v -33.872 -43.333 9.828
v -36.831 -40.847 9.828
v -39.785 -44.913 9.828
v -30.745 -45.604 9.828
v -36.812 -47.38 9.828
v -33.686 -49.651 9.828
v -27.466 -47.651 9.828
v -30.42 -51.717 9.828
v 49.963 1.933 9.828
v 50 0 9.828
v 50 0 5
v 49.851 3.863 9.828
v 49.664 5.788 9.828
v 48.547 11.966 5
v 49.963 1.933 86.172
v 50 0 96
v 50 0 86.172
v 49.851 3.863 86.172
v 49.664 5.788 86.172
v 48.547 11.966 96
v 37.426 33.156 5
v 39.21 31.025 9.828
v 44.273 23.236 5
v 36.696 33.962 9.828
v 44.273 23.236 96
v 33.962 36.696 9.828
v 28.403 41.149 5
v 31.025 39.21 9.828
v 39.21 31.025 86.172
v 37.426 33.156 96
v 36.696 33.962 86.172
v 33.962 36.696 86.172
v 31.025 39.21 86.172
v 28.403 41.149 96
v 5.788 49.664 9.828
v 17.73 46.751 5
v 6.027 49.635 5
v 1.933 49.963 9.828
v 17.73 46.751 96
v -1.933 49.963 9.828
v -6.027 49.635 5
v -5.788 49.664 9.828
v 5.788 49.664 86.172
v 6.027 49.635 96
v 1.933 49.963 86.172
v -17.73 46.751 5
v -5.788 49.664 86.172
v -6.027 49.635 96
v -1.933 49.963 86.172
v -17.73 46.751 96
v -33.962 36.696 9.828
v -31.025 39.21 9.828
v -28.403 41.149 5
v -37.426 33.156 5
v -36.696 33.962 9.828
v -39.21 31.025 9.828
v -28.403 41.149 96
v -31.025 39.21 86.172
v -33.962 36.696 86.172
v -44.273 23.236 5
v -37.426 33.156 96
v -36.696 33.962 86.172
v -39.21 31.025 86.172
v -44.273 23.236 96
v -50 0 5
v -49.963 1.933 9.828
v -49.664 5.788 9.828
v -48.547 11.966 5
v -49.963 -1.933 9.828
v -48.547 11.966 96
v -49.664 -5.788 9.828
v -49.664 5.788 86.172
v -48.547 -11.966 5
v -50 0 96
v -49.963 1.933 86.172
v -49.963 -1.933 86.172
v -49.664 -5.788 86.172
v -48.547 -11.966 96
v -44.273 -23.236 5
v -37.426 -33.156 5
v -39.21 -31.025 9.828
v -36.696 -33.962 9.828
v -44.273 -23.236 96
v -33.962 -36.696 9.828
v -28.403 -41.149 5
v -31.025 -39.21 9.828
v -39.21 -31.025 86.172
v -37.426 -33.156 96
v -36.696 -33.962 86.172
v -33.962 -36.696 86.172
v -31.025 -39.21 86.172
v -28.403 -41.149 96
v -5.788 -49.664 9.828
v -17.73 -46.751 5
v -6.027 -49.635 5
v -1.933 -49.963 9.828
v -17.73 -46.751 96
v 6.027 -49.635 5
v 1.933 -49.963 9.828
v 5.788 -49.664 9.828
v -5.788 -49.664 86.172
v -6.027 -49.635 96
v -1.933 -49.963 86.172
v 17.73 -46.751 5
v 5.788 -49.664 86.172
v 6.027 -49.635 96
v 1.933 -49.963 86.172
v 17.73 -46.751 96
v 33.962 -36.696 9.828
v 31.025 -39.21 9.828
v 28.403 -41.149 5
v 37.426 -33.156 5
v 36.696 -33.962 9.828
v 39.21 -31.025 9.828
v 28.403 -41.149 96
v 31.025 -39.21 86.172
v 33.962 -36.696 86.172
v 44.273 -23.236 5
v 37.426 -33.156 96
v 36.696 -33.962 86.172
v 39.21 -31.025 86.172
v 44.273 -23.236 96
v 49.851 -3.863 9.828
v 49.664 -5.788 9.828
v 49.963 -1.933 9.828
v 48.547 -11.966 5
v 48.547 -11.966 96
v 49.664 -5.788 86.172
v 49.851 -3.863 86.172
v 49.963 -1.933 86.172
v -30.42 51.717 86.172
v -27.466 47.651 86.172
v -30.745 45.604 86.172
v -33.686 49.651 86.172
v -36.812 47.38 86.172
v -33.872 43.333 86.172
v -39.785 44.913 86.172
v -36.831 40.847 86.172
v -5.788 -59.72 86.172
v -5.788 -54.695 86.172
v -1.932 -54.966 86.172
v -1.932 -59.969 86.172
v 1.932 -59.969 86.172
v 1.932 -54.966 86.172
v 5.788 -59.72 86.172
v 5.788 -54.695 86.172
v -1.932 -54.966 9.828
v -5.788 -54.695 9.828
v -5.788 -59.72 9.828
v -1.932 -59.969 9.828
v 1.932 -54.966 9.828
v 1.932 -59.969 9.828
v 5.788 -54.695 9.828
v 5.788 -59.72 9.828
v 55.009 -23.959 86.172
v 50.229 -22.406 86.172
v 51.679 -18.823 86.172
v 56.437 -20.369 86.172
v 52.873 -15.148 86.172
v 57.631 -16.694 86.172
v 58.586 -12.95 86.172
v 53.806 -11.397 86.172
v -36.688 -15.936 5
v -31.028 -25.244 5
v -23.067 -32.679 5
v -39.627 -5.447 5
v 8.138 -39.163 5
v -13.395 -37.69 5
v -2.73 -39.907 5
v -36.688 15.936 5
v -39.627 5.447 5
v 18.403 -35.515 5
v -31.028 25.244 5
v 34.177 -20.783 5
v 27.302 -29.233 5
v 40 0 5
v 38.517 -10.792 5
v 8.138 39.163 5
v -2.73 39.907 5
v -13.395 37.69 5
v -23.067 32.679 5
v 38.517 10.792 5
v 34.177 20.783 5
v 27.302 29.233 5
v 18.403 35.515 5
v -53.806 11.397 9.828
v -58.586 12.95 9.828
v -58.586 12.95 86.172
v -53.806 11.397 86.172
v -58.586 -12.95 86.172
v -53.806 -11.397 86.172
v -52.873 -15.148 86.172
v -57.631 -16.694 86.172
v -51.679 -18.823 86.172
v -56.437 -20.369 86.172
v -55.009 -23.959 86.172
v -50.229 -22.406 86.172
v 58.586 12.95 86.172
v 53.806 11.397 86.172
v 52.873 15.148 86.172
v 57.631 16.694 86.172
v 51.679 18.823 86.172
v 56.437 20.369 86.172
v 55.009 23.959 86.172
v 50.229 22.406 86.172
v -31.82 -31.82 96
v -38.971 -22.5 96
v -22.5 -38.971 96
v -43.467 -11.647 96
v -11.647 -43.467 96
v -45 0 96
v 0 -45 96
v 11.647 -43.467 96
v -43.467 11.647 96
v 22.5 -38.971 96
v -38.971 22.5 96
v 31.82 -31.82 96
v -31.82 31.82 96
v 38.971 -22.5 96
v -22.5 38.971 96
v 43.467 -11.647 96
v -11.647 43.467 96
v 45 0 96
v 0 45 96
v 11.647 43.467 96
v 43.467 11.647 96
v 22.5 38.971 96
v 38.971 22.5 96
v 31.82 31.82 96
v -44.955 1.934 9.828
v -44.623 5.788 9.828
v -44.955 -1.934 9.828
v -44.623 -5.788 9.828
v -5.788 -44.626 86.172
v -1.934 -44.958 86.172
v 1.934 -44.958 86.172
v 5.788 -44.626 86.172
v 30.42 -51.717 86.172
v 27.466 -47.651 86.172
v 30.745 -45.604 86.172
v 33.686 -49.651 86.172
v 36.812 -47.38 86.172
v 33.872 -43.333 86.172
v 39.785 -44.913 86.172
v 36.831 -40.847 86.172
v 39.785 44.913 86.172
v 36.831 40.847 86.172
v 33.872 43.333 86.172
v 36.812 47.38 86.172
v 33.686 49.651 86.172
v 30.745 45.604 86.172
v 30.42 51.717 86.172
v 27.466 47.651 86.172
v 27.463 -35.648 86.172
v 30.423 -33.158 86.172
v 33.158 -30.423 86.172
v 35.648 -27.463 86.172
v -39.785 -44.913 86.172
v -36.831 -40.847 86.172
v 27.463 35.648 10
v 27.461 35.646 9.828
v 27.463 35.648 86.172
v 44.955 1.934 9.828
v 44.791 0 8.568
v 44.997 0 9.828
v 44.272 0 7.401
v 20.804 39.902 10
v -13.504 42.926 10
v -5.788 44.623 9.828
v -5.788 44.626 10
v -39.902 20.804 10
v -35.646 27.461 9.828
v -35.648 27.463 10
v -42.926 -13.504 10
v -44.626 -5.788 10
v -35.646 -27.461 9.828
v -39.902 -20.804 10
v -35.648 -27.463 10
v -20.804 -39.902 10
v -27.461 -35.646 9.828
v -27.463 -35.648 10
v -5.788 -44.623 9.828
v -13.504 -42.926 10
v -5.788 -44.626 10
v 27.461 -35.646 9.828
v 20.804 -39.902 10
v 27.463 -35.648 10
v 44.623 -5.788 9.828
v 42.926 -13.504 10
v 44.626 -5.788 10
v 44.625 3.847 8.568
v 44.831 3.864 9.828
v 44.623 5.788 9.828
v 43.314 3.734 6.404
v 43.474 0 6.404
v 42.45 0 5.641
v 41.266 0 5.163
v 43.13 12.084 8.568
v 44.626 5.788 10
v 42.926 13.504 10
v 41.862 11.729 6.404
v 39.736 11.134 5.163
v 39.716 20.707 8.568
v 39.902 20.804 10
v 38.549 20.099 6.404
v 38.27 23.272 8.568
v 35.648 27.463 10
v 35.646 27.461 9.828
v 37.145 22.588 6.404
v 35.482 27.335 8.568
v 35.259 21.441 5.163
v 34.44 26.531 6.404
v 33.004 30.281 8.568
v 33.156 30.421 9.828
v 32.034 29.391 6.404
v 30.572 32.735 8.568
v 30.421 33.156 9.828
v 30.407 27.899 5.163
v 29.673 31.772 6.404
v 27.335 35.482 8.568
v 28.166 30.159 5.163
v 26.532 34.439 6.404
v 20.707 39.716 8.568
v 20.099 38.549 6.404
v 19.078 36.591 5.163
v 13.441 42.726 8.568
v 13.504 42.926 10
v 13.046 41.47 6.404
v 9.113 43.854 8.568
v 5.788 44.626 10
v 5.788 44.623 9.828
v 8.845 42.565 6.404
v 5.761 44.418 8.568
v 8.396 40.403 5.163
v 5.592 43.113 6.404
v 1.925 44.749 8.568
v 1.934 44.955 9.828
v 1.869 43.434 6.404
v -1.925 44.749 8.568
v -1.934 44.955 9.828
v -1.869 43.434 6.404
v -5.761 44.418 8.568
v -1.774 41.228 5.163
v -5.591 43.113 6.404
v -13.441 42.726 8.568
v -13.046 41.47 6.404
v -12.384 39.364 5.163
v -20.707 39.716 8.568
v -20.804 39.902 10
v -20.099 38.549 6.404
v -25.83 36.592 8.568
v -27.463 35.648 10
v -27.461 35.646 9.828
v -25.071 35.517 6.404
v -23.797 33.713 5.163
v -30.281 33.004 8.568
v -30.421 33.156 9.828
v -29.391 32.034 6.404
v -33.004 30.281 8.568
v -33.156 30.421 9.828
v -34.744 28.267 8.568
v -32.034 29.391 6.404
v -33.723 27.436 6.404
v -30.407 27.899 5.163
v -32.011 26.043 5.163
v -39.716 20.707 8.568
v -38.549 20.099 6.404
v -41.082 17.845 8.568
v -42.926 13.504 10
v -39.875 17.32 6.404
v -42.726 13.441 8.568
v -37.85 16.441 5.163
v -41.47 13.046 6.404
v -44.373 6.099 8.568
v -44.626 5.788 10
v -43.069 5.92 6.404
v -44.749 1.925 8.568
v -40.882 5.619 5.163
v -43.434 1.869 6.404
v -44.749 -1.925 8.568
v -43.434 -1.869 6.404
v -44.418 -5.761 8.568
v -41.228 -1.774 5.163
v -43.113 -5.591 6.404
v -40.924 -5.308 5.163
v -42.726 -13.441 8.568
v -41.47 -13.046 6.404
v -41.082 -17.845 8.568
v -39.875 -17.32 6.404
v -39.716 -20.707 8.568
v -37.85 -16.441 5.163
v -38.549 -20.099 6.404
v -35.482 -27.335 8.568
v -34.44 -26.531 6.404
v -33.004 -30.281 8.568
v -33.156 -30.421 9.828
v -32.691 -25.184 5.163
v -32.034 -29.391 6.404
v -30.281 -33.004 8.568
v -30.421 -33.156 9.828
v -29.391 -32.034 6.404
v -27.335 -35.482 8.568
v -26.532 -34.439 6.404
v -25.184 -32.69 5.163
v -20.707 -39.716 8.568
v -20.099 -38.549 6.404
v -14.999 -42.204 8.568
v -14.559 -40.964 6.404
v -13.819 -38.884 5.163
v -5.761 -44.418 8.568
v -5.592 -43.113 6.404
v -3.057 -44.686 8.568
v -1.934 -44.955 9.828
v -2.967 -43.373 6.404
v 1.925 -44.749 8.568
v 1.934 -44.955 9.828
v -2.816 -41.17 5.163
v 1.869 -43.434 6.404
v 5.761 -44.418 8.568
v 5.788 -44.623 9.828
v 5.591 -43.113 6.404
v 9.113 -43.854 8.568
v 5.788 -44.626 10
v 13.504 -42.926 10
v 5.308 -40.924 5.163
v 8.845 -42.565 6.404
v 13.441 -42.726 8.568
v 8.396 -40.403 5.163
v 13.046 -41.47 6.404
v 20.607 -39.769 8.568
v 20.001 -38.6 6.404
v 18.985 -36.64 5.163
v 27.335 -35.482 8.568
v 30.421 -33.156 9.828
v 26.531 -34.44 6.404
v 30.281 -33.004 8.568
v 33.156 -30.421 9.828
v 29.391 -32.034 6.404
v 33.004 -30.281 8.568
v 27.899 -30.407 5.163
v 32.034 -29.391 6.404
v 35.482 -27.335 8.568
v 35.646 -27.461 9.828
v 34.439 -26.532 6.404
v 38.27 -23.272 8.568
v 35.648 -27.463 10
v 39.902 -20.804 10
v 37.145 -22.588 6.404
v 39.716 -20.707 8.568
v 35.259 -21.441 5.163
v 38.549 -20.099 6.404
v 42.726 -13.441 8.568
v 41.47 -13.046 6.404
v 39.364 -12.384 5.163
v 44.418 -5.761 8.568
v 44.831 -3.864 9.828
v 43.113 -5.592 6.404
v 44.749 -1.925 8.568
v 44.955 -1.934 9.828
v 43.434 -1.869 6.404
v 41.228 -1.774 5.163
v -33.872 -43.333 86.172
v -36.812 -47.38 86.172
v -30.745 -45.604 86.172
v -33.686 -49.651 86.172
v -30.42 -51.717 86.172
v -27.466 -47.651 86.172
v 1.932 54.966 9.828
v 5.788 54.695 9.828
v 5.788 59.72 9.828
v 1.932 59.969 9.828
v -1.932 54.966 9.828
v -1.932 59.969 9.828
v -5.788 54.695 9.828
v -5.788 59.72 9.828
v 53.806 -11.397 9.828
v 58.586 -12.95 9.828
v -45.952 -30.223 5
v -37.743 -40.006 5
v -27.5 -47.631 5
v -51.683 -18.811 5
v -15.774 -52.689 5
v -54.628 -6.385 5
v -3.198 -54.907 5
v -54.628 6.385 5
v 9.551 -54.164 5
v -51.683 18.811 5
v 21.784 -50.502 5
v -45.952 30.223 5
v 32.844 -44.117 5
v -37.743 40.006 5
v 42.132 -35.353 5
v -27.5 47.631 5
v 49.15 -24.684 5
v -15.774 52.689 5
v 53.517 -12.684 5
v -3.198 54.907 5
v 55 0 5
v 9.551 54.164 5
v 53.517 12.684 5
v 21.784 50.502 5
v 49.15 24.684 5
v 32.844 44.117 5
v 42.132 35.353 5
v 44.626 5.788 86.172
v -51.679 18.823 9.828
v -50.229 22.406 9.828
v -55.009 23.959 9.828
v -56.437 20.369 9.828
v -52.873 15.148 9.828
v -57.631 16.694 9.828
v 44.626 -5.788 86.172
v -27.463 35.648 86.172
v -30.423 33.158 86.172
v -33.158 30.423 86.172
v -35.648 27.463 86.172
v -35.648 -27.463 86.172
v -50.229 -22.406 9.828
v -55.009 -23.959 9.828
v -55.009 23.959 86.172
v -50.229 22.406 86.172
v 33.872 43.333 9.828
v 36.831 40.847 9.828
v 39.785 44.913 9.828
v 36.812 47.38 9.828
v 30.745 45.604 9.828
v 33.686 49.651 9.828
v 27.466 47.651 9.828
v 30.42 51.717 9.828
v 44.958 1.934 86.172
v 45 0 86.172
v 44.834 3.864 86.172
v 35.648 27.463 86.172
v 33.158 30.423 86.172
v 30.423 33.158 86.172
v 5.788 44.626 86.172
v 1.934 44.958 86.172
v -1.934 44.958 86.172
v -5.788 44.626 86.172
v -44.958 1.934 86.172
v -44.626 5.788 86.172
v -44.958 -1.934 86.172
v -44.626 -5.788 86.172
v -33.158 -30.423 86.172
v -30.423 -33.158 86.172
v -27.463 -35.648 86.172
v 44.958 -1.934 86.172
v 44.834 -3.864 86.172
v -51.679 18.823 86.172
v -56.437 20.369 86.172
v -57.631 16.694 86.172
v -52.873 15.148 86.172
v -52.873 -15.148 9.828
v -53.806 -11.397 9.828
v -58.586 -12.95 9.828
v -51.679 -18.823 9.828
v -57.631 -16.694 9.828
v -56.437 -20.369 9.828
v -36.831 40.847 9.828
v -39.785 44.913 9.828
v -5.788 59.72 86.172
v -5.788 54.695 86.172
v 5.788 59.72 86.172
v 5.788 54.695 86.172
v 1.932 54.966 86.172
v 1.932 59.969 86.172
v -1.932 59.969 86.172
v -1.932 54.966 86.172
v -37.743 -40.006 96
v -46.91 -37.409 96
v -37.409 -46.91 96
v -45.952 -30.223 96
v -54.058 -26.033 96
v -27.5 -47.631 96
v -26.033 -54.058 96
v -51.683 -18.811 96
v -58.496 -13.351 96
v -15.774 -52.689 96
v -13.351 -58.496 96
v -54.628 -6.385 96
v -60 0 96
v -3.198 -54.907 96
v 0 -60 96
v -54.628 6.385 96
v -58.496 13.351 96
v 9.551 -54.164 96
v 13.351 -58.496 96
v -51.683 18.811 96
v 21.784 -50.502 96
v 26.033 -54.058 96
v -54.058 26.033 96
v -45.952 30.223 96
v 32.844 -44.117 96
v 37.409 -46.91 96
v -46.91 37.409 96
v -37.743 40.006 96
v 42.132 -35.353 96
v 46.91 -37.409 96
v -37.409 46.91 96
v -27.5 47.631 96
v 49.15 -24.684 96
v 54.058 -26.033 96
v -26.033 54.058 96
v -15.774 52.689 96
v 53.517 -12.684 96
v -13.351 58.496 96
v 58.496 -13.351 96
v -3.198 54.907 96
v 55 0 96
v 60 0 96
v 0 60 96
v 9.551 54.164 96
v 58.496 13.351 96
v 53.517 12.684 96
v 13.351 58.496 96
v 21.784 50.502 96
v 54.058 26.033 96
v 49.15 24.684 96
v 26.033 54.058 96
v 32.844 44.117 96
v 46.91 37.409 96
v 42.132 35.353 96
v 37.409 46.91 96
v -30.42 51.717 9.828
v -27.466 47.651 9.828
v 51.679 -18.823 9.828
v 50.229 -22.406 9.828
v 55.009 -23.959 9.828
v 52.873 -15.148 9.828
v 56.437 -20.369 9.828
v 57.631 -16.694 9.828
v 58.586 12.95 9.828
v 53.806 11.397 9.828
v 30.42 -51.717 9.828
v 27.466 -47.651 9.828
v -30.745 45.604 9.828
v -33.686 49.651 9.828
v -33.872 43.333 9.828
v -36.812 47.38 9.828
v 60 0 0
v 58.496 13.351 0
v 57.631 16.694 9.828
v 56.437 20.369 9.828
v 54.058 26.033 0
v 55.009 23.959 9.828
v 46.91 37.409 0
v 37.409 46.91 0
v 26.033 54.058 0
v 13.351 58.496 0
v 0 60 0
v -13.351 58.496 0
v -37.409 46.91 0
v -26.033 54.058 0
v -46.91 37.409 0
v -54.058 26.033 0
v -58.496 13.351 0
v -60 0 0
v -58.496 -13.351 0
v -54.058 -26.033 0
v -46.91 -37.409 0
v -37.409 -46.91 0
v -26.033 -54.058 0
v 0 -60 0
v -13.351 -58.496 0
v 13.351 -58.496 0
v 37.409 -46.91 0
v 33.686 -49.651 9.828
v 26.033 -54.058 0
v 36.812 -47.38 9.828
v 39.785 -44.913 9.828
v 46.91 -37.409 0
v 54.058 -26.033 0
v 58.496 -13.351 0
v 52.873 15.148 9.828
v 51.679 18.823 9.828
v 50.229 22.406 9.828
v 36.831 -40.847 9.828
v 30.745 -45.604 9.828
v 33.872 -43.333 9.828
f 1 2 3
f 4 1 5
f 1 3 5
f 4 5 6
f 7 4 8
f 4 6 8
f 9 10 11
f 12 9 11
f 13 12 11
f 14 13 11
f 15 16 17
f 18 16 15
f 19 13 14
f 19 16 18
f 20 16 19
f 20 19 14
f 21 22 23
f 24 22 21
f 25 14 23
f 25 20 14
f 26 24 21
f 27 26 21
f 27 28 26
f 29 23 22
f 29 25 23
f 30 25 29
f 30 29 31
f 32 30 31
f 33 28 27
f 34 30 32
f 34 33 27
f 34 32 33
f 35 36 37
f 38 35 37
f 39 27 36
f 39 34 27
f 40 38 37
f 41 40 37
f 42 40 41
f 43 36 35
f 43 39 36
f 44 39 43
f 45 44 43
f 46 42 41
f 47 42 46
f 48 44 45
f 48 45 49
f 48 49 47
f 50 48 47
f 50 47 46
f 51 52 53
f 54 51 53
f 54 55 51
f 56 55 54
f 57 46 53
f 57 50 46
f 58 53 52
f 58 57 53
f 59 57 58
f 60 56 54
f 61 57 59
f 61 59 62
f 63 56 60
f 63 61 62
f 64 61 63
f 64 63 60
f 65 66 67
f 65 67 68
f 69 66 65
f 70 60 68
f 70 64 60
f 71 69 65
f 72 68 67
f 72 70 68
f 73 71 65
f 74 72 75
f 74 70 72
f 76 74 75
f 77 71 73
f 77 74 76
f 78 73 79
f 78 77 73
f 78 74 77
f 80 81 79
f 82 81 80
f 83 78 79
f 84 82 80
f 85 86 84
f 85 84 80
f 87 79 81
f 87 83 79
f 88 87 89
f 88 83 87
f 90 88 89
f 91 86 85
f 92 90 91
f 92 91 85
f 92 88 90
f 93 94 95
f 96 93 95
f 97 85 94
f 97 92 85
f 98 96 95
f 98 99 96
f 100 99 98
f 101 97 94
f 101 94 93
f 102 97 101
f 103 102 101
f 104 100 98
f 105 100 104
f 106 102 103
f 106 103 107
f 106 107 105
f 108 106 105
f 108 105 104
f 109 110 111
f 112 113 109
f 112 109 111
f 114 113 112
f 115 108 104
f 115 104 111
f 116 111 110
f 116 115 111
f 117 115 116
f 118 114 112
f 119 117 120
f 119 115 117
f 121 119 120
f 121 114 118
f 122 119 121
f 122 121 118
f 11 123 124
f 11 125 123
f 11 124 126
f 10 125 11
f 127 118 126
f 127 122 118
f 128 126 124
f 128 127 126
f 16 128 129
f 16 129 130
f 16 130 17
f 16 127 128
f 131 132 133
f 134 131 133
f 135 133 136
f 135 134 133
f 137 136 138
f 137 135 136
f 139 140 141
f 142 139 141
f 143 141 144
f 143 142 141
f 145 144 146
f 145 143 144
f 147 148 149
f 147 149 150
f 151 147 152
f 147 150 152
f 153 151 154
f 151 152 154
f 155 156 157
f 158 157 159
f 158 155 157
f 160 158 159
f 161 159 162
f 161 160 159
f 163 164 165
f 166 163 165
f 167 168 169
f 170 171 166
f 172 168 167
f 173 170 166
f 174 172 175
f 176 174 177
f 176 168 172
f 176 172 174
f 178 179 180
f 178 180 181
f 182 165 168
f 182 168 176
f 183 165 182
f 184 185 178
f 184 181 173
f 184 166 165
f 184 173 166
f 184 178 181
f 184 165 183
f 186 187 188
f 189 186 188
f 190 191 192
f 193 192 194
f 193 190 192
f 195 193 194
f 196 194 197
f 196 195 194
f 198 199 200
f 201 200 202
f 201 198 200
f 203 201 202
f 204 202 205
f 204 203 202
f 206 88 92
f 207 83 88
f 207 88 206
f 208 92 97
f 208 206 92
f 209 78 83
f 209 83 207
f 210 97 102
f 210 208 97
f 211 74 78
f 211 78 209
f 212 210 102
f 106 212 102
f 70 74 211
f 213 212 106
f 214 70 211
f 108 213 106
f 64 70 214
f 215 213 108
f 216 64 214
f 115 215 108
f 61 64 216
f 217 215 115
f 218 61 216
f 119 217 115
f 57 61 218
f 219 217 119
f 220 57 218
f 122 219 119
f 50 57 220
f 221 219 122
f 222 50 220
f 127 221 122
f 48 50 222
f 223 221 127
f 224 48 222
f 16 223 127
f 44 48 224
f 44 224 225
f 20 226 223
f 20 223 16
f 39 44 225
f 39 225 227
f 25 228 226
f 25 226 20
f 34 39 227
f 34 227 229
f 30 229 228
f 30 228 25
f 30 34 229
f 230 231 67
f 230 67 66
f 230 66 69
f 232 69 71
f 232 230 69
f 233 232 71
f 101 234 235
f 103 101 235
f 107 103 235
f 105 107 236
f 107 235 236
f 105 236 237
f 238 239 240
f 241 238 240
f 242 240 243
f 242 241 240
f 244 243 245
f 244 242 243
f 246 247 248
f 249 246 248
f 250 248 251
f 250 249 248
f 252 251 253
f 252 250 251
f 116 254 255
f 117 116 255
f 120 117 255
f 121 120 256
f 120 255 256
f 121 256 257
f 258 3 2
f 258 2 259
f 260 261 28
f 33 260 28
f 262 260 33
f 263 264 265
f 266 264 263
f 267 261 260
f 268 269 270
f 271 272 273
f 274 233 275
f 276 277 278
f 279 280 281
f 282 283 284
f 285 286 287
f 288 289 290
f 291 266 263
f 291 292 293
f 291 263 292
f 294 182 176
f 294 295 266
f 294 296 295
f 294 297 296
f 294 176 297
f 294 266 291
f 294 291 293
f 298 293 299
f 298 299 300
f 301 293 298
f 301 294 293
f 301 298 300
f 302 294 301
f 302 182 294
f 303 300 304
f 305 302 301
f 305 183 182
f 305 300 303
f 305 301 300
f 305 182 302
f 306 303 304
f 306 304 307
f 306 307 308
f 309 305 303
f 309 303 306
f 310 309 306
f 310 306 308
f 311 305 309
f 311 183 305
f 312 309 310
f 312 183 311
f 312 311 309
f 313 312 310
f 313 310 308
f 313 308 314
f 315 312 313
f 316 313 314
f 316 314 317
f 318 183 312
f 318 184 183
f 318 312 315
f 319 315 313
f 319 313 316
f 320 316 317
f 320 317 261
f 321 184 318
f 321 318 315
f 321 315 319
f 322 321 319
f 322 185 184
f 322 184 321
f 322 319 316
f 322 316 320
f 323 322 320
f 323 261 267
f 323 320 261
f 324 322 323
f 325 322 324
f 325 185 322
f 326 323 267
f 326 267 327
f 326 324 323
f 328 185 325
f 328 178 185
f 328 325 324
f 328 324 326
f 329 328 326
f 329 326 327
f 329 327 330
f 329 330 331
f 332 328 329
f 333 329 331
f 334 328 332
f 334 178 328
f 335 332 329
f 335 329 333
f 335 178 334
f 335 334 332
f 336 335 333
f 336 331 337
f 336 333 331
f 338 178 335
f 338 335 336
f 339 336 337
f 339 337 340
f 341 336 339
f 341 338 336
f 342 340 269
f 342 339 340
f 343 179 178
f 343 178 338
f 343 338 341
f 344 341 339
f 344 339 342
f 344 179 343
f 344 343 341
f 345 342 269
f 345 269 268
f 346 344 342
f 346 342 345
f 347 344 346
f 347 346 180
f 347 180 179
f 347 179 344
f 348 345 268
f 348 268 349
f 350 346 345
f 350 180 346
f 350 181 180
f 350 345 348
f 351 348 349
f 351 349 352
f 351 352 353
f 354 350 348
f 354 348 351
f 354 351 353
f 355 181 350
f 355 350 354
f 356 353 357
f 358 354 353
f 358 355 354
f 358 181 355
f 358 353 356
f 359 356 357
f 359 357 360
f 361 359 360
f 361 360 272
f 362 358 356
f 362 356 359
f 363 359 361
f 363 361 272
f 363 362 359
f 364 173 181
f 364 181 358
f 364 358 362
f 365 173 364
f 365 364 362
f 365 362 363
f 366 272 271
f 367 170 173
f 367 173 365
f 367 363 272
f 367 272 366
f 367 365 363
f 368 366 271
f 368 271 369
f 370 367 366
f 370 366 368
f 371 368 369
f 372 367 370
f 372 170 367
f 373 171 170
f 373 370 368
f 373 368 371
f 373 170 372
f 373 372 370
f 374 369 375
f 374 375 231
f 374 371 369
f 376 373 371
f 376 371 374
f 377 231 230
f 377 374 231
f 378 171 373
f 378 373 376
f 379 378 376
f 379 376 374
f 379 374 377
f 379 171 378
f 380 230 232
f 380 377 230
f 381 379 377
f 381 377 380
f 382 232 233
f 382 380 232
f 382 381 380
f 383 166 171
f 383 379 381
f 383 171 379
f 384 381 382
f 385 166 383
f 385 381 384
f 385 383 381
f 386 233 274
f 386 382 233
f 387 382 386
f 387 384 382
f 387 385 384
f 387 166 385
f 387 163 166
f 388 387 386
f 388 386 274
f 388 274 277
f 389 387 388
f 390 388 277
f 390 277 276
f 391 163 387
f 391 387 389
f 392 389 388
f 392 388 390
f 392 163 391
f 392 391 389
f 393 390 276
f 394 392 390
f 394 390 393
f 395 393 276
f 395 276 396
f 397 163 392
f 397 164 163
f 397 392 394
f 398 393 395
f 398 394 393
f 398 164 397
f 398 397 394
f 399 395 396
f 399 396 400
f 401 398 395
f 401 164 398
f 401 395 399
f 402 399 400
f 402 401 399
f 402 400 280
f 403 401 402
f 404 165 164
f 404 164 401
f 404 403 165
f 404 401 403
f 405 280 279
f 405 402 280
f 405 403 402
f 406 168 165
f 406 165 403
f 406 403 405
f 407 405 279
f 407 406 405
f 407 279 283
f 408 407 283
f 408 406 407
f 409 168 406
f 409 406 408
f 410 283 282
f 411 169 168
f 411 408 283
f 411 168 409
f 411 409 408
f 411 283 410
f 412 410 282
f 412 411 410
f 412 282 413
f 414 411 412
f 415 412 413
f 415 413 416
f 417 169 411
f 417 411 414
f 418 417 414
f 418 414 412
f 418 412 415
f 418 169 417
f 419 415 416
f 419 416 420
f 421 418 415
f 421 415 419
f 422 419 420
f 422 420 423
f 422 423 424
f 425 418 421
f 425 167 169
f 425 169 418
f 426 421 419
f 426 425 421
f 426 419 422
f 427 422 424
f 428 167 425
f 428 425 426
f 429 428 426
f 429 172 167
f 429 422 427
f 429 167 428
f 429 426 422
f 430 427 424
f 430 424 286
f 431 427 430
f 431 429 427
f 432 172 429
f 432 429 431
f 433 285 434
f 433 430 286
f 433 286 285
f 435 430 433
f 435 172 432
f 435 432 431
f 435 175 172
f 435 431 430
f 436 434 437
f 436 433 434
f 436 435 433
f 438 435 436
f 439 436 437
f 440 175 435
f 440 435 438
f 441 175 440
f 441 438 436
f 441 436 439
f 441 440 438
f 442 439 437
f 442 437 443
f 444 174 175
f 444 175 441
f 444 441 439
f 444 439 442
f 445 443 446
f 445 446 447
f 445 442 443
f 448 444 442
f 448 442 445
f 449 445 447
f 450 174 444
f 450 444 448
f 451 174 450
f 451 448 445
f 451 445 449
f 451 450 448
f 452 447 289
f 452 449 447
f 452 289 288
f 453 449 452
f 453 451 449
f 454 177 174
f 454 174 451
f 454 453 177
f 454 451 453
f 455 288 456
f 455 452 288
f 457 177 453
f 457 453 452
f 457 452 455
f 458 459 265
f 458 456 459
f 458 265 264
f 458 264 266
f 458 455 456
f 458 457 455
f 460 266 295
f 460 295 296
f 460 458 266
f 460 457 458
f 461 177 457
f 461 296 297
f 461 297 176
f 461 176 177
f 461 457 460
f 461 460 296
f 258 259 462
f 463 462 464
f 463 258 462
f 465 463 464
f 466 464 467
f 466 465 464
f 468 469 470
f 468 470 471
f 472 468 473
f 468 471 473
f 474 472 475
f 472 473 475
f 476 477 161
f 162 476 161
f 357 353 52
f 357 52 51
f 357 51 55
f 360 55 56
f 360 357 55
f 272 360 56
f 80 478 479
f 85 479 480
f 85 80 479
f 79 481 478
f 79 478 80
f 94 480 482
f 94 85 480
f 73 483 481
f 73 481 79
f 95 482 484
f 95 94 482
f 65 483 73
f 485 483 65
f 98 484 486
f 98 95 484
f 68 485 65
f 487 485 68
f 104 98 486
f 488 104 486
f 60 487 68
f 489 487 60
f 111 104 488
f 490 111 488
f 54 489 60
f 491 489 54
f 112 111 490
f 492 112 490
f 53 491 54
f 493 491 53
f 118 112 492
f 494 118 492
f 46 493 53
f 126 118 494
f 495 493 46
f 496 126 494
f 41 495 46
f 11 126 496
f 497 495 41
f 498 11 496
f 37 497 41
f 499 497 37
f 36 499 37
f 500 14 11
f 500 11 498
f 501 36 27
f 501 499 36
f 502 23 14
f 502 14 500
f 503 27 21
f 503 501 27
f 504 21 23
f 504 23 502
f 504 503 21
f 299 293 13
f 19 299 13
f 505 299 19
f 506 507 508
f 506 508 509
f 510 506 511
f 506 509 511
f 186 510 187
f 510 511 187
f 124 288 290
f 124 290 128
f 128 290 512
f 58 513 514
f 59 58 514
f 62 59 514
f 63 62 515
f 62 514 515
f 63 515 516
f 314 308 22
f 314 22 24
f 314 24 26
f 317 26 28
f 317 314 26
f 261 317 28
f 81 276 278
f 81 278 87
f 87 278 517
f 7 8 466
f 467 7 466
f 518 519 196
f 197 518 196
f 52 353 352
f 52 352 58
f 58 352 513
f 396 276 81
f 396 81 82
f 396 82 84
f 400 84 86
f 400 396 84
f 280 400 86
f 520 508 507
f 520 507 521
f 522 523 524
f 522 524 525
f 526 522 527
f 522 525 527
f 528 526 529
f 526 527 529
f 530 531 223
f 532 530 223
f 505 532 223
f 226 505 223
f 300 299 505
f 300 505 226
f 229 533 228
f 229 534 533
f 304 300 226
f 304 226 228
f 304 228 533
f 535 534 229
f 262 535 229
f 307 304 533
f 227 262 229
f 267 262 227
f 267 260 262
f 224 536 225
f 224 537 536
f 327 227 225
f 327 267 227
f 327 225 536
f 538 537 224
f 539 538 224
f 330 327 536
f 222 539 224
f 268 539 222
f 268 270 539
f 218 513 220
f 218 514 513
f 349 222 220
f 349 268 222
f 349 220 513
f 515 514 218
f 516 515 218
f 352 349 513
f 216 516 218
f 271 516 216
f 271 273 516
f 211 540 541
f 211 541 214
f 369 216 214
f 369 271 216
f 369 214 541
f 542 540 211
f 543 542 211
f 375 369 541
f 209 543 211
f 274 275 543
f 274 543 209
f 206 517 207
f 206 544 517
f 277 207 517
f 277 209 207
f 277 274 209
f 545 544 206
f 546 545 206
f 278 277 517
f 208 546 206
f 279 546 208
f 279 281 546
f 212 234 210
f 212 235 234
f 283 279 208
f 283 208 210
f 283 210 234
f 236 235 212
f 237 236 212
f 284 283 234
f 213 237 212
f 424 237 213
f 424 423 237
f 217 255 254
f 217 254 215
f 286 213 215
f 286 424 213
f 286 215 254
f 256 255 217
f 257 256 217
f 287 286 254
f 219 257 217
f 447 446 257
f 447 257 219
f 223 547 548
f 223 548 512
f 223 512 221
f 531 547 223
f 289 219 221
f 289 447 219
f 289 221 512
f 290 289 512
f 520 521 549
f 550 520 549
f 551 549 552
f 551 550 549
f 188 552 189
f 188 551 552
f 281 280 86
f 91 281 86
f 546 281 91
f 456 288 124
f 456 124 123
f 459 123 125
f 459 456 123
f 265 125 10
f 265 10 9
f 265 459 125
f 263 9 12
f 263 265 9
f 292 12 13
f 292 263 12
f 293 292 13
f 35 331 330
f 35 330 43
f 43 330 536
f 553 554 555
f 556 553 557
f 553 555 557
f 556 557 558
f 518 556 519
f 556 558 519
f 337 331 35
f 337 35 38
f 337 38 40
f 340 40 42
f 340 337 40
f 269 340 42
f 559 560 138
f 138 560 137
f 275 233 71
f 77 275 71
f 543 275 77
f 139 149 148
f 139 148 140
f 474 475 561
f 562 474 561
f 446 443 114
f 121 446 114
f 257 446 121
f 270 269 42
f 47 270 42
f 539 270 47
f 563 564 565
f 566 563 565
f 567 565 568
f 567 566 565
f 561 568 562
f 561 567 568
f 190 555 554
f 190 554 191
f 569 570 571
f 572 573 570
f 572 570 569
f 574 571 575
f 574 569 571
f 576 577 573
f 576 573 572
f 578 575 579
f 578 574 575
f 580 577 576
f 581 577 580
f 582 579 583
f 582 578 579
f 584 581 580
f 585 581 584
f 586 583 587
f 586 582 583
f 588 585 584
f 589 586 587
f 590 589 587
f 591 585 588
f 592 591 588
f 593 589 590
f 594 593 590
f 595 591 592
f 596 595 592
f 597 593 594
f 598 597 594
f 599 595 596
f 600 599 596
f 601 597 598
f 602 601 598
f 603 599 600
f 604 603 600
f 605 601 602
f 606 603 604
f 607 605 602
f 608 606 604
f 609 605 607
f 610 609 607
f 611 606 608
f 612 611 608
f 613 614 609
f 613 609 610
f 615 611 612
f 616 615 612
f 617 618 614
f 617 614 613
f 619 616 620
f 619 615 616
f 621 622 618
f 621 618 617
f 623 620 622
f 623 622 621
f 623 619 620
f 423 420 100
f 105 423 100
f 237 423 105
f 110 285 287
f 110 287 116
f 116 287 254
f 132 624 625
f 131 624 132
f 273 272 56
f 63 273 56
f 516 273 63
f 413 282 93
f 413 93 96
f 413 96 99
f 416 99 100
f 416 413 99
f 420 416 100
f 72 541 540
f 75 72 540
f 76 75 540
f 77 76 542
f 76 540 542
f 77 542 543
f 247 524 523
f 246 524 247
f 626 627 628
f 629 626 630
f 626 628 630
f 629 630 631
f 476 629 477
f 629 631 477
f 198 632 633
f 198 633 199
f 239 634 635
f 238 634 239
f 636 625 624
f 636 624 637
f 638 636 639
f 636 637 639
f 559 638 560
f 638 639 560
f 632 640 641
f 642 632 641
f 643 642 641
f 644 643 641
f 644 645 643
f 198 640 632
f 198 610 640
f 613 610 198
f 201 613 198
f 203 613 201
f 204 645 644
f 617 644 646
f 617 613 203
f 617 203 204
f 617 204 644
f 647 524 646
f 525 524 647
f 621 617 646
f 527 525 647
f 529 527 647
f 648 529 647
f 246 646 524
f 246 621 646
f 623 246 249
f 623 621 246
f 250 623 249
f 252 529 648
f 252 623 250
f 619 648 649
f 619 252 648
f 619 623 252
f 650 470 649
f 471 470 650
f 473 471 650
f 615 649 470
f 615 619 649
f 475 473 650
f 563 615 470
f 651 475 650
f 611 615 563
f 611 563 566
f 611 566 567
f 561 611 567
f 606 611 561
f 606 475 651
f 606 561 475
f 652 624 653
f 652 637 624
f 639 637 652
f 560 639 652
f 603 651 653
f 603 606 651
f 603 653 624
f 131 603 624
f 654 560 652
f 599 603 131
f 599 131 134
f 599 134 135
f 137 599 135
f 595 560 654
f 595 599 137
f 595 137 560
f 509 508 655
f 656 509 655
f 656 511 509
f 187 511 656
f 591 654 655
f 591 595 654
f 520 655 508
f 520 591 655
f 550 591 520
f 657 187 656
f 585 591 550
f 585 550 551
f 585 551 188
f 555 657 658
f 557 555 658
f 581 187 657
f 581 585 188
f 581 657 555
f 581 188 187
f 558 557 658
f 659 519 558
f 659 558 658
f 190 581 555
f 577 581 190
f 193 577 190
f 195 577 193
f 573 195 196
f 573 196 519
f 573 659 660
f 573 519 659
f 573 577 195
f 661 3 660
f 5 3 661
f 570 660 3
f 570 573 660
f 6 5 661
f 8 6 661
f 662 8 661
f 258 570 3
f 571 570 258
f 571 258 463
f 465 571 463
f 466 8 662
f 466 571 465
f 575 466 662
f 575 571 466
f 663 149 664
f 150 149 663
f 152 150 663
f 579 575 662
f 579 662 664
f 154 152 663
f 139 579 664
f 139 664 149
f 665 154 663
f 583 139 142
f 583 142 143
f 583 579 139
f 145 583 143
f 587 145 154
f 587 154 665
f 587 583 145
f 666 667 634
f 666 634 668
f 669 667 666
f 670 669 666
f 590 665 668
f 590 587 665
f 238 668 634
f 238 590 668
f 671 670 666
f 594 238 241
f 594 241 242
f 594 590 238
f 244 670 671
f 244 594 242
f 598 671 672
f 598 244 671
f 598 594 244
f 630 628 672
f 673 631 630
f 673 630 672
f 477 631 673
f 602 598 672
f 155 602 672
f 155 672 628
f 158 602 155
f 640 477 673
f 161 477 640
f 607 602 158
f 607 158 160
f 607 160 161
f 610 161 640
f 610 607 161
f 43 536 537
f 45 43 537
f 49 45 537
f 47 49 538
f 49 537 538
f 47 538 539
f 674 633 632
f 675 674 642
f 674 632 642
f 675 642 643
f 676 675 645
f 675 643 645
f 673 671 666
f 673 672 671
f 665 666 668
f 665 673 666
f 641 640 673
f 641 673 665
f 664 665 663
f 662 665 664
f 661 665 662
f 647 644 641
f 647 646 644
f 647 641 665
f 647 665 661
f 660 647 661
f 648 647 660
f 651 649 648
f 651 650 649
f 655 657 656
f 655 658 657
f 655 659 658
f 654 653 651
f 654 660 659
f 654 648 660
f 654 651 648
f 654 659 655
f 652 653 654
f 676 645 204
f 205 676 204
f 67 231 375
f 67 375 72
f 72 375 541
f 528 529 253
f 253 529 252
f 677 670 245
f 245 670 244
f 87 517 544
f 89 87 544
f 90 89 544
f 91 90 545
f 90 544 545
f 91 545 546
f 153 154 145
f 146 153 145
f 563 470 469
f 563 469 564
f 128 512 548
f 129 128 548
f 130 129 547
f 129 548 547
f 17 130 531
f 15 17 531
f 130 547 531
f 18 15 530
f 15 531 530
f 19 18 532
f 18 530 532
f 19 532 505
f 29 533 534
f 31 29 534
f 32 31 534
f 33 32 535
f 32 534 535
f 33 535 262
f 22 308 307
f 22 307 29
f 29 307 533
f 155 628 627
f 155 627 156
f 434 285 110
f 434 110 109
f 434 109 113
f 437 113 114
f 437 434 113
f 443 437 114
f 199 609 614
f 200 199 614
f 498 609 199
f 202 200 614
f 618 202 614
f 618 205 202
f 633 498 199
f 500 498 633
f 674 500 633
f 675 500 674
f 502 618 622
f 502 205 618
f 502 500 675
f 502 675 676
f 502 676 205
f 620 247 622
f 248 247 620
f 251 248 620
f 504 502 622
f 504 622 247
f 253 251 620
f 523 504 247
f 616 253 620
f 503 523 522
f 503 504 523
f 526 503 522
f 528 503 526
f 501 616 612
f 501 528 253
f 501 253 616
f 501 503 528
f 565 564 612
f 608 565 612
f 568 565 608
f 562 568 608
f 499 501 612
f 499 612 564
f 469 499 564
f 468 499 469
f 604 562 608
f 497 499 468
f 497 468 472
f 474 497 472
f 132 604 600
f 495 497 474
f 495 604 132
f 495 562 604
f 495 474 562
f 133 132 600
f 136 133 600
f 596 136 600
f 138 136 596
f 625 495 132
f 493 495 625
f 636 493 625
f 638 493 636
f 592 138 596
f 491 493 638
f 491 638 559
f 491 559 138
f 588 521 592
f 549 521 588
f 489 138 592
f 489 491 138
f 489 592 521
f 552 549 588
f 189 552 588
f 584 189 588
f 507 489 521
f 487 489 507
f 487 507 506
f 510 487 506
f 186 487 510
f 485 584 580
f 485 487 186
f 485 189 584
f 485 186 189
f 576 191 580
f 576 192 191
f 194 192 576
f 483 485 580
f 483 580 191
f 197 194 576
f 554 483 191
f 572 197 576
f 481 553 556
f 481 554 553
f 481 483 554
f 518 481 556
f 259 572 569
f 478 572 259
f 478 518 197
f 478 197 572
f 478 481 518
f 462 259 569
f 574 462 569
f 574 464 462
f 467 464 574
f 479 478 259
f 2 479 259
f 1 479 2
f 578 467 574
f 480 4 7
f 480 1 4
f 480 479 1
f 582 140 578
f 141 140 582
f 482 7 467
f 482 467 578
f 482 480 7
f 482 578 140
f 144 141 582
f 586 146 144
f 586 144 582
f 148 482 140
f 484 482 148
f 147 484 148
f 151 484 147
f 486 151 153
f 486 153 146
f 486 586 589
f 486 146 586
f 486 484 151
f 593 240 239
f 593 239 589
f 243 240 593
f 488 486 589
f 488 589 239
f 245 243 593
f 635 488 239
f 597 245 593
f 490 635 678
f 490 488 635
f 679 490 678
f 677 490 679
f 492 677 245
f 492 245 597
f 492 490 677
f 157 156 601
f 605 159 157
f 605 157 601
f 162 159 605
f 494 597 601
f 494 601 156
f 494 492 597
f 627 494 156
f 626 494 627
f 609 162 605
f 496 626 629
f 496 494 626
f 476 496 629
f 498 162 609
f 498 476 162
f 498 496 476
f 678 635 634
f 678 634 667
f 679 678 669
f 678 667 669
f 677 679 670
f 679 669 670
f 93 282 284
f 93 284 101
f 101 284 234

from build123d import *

# Parameters (mm, degrees)
F2_W            = 11.5754483268
F2_H            = 76.3443418741
F3_REACH        = 137.2178993172
F3_COPIES_COUNT = 8
F5_W            = 11.5754483268
F5_H            = 76.3443418741
F6_REACH        = 212.2178993172
F6_COPIES_COUNT = 10


# Not quite as in the source:
# - a pattern or mirror of a feature is missing from the dataset's text; its kind, count and spacing are read off the source's solid


with BuildPart() as f1:
    # F0 (on Front) → F1 (revolve)
    with BuildSketch(Plane.XZ):
        with BuildLine():
            Line((0, 5), (0, 0))
            Line((0, 0), (60, 0))
            Line((60, 0), (60, 96))
            Line((60, 96), (55, 96))
            Line((55, 96), (55, 5))
            Line((55, 5), (50, 5))
            Line((50, 5), (50, 96))
            Line((50, 96), (45, 96))
            Line((45, 96), (45, 10))
            ThreePointArc((45, 10), (43.5355339059, 6.4644660941), (40, 5))
            Line((40, 5), (0, 5))
        make_face()
    revolve(axis=Axis((0, 0, 2.5), (0, 0, 1)))

    f3_end = f1.faces().sort_by_distance((-50, 0, 50.5))[0]
    # F2 (on Front) → F3 (cut, up to a face of the model that its end follows)
    with BuildSketch(Plane.XZ):
        with Locations((0, 48)):
            Rectangle(F2_W, F2_H)
    f3_long = extrude(amount=F3_REACH, mode=Mode.PRIVATE)
    f3 = split(f3_long, bisect_by=f3_end, keep=Keep.BOTTOM, mode=Mode.PRIVATE)
    add(f3, mode=Mode.SUBTRACT)

    # F3_copies: F3 ×8 about axis
    f3_copies_axis = Axis((0, 0, 0), (0, 0, 1))
    for i in range(1, F3_COPIES_COUNT):
        add(f3.rotate(f3_copies_axis, i * 360 / F3_COPIES_COUNT), mode=Mode.SUBTRACT)

    f6_end = f1.faces().sort_by_distance((-55, 0, 50.5))[0]
    # F5 (on offset) → F6 (cut, up to a face of the model that its end follows)
    with BuildSketch(Plane.XZ.offset(75)):
        with Locations((0, 48)):
            Rectangle(F5_W, F5_H)
    f6_long = extrude(amount=-F6_REACH, mode=Mode.PRIVATE)
    f6 = split(f6_long, bisect_by=f6_end, keep=Keep.ALL, mode=Mode.PRIVATE).solids().sort_by_distance((0, -75, 48))[0]
    add(f6, mode=Mode.SUBTRACT)

    # F6_copies: F6 ×10 about axis
    f6_copies_axis = Axis((0, 0, 0), (0, 0, 1))
    for i in range(1, F6_COPIES_COUNT):
        add(f6.rotate(f6_copies_axis, i * 360 / F6_COPIES_COUNT), mode=Mode.SUBTRACT)


solid = f1.part
